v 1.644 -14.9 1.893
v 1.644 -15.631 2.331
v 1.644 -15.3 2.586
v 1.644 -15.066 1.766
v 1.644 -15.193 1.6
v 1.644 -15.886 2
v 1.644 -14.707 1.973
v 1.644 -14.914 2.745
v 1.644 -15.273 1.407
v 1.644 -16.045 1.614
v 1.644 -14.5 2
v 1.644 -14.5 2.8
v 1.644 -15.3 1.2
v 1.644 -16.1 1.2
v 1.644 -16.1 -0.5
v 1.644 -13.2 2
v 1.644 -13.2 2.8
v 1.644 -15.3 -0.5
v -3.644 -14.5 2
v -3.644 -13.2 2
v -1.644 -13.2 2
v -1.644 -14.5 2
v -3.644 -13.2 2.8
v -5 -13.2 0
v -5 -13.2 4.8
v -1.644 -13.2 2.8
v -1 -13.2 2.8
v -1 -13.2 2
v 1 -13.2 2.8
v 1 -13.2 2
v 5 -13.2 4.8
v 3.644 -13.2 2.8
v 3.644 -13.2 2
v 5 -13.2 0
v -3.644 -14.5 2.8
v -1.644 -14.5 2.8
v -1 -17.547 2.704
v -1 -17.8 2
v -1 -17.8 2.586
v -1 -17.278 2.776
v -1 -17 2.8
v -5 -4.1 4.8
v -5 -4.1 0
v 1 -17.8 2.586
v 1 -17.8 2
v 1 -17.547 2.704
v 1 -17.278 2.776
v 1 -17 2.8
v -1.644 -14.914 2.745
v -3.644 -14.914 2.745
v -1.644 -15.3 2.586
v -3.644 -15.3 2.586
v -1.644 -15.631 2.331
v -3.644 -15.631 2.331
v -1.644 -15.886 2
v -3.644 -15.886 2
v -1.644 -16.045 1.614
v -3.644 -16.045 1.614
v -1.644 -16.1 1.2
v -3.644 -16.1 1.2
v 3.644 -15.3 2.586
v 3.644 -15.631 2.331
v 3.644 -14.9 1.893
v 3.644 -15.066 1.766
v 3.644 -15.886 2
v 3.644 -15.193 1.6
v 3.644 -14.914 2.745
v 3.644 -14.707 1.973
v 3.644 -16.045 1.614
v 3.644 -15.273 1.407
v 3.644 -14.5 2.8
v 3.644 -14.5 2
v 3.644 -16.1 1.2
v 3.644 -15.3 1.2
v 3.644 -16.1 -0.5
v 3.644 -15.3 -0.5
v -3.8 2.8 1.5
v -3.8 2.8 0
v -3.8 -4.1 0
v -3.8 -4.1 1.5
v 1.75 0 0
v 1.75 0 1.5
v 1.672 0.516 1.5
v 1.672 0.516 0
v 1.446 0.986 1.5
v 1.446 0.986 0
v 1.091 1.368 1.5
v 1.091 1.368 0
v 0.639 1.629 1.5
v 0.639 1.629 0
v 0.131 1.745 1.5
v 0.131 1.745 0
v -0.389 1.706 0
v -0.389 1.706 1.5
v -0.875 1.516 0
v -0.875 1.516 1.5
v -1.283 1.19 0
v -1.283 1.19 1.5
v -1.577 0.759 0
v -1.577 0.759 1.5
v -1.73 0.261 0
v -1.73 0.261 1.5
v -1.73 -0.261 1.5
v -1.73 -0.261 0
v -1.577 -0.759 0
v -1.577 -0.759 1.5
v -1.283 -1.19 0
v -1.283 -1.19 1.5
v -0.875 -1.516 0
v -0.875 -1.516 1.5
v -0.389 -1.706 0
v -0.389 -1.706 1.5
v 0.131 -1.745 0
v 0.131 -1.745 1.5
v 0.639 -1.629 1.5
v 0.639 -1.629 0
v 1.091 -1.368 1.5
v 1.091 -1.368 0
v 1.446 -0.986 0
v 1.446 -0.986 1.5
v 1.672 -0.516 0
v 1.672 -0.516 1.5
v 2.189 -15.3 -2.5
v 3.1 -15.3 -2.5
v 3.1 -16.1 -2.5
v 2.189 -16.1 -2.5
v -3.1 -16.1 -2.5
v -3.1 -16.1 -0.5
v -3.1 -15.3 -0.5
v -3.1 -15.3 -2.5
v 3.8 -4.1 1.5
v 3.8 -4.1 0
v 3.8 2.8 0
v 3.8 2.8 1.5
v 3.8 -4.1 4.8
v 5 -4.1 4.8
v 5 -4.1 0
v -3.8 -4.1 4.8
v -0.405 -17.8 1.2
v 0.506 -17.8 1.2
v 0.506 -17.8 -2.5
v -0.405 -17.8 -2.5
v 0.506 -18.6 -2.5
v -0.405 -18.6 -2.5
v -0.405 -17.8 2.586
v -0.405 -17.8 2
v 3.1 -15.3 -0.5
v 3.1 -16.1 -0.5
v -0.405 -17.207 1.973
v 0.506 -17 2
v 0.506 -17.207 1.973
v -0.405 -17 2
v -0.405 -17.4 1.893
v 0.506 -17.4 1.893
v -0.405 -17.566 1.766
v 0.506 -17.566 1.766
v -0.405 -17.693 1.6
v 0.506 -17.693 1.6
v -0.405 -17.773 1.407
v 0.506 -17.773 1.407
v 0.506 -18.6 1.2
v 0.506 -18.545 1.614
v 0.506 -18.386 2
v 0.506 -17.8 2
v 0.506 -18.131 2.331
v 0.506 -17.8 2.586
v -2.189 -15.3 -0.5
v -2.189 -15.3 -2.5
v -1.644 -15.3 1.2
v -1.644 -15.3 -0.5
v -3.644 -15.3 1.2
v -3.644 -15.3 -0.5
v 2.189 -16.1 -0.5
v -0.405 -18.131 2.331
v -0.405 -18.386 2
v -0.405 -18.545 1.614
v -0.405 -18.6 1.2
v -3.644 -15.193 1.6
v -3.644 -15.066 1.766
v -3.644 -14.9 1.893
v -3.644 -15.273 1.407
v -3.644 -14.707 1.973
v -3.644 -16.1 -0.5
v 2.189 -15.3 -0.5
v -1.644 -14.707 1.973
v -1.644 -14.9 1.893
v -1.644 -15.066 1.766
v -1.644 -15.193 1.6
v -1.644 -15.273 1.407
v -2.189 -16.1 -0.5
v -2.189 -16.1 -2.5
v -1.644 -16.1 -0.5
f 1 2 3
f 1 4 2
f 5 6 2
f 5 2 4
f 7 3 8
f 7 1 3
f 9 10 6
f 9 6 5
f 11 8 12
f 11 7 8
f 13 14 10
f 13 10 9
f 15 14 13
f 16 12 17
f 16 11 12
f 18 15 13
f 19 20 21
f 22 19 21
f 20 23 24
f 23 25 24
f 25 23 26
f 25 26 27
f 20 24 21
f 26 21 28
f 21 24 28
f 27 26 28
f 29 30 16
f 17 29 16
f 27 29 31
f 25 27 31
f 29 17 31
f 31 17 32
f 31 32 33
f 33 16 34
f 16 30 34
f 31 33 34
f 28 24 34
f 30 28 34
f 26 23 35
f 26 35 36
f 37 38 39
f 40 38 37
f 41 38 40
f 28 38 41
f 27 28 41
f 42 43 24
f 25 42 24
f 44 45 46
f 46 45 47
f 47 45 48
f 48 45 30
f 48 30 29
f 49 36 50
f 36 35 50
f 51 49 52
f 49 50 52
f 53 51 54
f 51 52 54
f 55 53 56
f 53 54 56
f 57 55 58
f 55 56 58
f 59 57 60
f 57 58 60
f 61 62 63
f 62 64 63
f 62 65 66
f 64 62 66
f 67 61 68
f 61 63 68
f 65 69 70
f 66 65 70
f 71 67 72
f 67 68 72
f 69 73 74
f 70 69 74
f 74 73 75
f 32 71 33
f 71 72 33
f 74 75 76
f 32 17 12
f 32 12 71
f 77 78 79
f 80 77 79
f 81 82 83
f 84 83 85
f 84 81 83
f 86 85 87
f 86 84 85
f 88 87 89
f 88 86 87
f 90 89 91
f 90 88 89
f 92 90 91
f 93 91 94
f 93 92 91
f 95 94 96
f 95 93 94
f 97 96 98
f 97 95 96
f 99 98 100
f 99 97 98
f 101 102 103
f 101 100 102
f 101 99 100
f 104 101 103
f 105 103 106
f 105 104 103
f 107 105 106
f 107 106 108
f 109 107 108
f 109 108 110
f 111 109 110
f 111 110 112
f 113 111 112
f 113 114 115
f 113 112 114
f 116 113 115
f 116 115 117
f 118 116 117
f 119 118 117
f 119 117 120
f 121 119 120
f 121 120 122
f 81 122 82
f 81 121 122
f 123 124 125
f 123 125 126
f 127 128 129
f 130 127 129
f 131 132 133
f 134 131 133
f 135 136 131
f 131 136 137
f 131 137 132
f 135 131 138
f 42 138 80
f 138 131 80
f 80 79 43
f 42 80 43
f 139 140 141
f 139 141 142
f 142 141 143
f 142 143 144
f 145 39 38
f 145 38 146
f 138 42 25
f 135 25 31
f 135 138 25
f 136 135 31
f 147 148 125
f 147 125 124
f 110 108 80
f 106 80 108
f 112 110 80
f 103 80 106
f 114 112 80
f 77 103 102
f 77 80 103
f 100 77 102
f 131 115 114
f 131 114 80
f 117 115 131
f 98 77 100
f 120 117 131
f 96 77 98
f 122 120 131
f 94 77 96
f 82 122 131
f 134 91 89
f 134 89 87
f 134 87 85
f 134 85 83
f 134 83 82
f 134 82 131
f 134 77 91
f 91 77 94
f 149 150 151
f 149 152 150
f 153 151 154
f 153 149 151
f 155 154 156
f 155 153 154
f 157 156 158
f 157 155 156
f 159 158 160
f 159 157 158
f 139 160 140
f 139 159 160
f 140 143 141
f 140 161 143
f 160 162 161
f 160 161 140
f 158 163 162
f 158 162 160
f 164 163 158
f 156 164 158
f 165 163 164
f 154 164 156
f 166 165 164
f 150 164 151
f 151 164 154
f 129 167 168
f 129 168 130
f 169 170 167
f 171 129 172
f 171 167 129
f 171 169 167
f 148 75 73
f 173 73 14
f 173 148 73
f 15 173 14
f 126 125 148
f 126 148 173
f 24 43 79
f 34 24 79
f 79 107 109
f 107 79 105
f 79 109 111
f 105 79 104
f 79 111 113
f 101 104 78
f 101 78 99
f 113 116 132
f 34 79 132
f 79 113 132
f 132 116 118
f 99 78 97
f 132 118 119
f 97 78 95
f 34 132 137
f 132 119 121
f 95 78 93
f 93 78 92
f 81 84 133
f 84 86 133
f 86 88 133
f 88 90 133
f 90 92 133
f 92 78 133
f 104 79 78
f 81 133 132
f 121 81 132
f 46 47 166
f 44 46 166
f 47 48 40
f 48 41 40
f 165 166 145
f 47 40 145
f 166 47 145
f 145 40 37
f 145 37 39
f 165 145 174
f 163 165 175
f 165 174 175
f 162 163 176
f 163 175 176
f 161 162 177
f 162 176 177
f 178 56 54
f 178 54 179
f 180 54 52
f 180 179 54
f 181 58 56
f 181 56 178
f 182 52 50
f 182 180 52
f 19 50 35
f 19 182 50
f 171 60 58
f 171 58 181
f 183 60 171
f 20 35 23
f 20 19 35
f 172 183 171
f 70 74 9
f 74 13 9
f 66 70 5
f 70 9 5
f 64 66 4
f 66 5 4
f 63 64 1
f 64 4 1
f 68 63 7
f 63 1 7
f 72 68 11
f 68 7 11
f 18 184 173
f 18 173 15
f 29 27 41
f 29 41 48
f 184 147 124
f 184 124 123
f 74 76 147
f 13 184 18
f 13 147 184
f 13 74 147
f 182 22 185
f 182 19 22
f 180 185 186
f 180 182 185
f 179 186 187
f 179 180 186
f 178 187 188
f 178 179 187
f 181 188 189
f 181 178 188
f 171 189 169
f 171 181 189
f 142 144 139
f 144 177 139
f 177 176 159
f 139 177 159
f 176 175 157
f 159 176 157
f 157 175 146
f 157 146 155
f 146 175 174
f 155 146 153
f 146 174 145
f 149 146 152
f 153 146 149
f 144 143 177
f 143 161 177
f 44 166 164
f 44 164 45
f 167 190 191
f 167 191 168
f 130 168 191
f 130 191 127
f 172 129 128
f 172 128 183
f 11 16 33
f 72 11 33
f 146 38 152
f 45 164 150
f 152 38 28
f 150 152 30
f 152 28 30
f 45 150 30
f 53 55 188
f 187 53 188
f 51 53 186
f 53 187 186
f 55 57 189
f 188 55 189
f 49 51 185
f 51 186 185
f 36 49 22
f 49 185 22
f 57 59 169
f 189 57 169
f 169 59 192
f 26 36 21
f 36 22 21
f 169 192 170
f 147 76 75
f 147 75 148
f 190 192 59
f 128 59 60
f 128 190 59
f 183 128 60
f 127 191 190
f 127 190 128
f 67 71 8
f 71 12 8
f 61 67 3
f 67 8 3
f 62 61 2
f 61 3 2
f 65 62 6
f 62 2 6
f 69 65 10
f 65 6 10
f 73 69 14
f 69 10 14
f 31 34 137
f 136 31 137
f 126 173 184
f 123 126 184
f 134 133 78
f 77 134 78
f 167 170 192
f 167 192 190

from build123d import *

# Parameters (mm, degrees)
SKETCH_1_R                  = 1.75
EXTRUDE_1_DEPTH             = 4.8
SKETCH_2_W                  = 12.314395844
SKETCH_2_H                  = 6.906876711
CUT_EXTRUDE_1_DEPTH         = 3.3
SKETCH_3_W                  = 2
SKETCH_3_H                  = 0.8
EXTRUDE_2_DEPTH             = 5
SKETCH_4_W                  = 2
SKETCH_4_H                  = 0.8
CUT_EXTRUDE_2_DEPTH         = 2.5
SKETCH_5_W                  = 0.911290814
SKETCH_5_H                  = 0.8
SKETCH_5_W_2                = 2
EXTRUDE_3_DEPTH             = 2.5
EXTRUDE_3_DIRECTION_2_REACH = 21.081
SKETCH_6_W                  = 0.493961758
SKETCH_6_H                  = 0.8
SKETCH_6_W_2                = 0.594747428
CUT_EXTRUDE_3_DEPTH         = 0.4
FILLET_1_R                  = 0.8
FILLET_2_R                  = 1.6
SKETCH_7_W                  = 0.911290814
SKETCH_7_H                  = 0.8
SKETCH_7_W_2                = 0.911290815
EXTRUDE_4_DEPTH             = 2


with BuildPart() as part:
    # Эскиз1 → Вытянуть1 (new body)
    with BuildSketch(Plane.XY):
        Polygon((-3.8, 2.8), (-3.8, -4.1), (-5, -4.1), (-5, -13.2), (5, -13.2), (5, -4.1), (3.8, -4.1), (3.8, 2.8), align=None)
        Circle(SKETCH_1_R, mode=Mode.SUBTRACT)
    extrude(amount=EXTRUDE_1_DEPTH)

    # Эскиз2 → Вырез-Вытянуть1 (cut)
    with BuildSketch(Plane.XY.offset(4.8)):
        with Locations((-0.012289816, -0.646561645)):
            Rectangle(SKETCH_2_W, SKETCH_2_H)
    extrude(amount=-CUT_EXTRUDE_1_DEPTH, mode=Mode.SUBTRACT)

    # Эскиз3 → Вытянуть2 (add)
    with BuildSketch(Plane.XZ.offset(13.2)):
        with Locations((0, 2.4)):
            Rectangle(SKETCH_3_W, SKETCH_3_H)
        with Locations((-2.644349478, 2.4)):
            Rectangle(SKETCH_3_W, SKETCH_3_H)
        with Locations((2.644349478, 2.4)):
            Rectangle(SKETCH_3_W, SKETCH_3_H)
    extrude(amount=EXTRUDE_2_DEPTH)

    # Эскиз4 → Вырез-Вытянуть2 (cut)
    with BuildSketch(Plane.XZ.offset(18.2)):
        with Locations((2.644349478, 2.4)):
            Rectangle(SKETCH_4_W, SKETCH_4_H)
        with Locations((-2.644349478, 2.4)):
            Rectangle(SKETCH_4_W, SKETCH_4_H)
    extrude(amount=-CUT_EXTRUDE_2_DEPTH, mode=Mode.SUBTRACT)

    # Эскиз5 → Вытянуть3 (add)
    with BuildSketch(Plane(origin=(0, 0, 2), x_dir=(-1, 0, 0), z_dir=(0, 0, -1))):
        with Locations((-0.050392835, -18.2)):
            Rectangle(SKETCH_5_W, SKETCH_5_H)
        with Locations((2.644349478, -15.7)):
            Rectangle(SKETCH_5_W_2, SKETCH_5_H)
        with Locations((-2.644349478, -15.7)):
            Rectangle(SKETCH_5_W_2, SKETCH_5_H)
    extrude(amount=EXTRUDE_3_DEPTH)

    # Вытянуть3 direction 2: up to this face of the body (flat: up to its plane)
    extrude_3_direction_2_end = Plane(part.part.faces().sort_by_distance((-2.644349478, -14.45, 2.8))[0])
    # Эскиз5 → Вытянуть3 direction 2 (add, up to the picked face)
    with BuildSketch(Plane(origin=(0, 0, 2), x_dir=(-1, 0, 0), z_dir=(0, 0, -1)), mode=Mode.PRIVATE) as extrude_3_direction_2_sk1:
        with Locations((-0.050392835, -18.2)):
            Rectangle(SKETCH_5_W, SKETCH_5_H)
    extrude_3_direction_2_tool1 = split(extrude(extrude_3_direction_2_sk1.sketch, amount=-EXTRUDE_3_DIRECTION_2_REACH, mode=Mode.PRIVATE), bisect_by=extrude_3_direction_2_end, keep=Keep.BOTH, mode=Mode.PRIVATE)
    # Эскиз5 → Вытянуть3 direction 2 (add, up to the picked face)
    with BuildSketch(Plane(origin=(0, 0, 2), x_dir=(-1, 0, 0), z_dir=(0, 0, -1)), mode=Mode.PRIVATE) as extrude_3_direction_2_sk2:
        with Locations((2.644349478, -15.7)):
            Rectangle(SKETCH_5_W_2, SKETCH_5_H)
    extrude_3_direction_2_tool2 = split(extrude(extrude_3_direction_2_sk2.sketch, amount=-EXTRUDE_3_DIRECTION_2_REACH, mode=Mode.PRIVATE), bisect_by=extrude_3_direction_2_end, keep=Keep.BOTH, mode=Mode.PRIVATE)
    # Эскиз5 → Вытянуть3 direction 2 (add, up to the picked face)
    with BuildSketch(Plane(origin=(0, 0, 2), x_dir=(-1, 0, 0), z_dir=(0, 0, -1)), mode=Mode.PRIVATE) as extrude_3_direction_2_sk3:
        with Locations((-2.644349478, -15.7)):
            Rectangle(SKETCH_5_W_2, SKETCH_5_H)
    extrude_3_direction_2_tool3 = split(extrude(extrude_3_direction_2_sk3.sketch, amount=-EXTRUDE_3_DIRECTION_2_REACH, mode=Mode.PRIVATE), bisect_by=extrude_3_direction_2_end, keep=Keep.BOTH, mode=Mode.PRIVATE)
    add(extrude_3_direction_2_tool1.solids().sort_by(Axis((0.050393, -18.2, 2), (0, 0, 1)))[0])
    add(extrude_3_direction_2_tool2.solids().sort_by(Axis((-2.644349, -15.7, 2), (0, 0, 1)))[0])
    add(extrude_3_direction_2_tool3.solids().sort_by(Axis((2.644349, -15.7, 2), (0, 0, 1)))[0])

    # Эскиз6 → Вырез-Вытянуть3 (cut)
    with BuildSketch(Plane.XZ.offset(18.2)):
        with Locations((0.753019121, 2.4)):
            Rectangle(SKETCH_6_W, SKETCH_6_H)
        with Locations((-0.702626286, 2.4)):
            Rectangle(SKETCH_6_W_2, SKETCH_6_H)
    extrude(amount=-CUT_EXTRUDE_3_DEPTH, mode=Mode.SUBTRACT)

    # Скругление1
    fillet_1_edges = [part.edges().sort_by_distance(p)[0] for p in [
        (0.050392835, -17.8, 2),
        (-2.644349478, -15.3, 2),
        (2.644349478, -15.3, 2),
    ]]
    fillet(fillet_1_edges, radius=FILLET_1_R)

    # Скругление2
    fillet_2_edges = [part.edges().sort_by_distance(p)[0] for p in [
        (-2.644349478, -16.1, 2.8),
        (0.050392835, -18.6, 2.8),
        (2.644349478, -16.1, 2.8),
    ]]
    fillet(fillet_2_edges, radius=FILLET_2_R)

    # Эскиз7 → Вытянуть4 (add)
    with BuildSketch(Plane(origin=(0, 0, -0.5), x_dir=(-1, 0, 0), z_dir=(0, 0, -1))):
        with Locations((-0.050392835, -18.2)):
            Rectangle(SKETCH_7_W, SKETCH_7_H)
        with Locations((-2.644349478, -15.7)):
            Rectangle(SKETCH_7_W_2, SKETCH_7_H)
        with Locations((2.644349478, -15.7)):
            Rectangle(SKETCH_7_W_2, SKETCH_7_H)
    extrude(amount=EXTRUDE_4_DEPTH)


solid = part.part
